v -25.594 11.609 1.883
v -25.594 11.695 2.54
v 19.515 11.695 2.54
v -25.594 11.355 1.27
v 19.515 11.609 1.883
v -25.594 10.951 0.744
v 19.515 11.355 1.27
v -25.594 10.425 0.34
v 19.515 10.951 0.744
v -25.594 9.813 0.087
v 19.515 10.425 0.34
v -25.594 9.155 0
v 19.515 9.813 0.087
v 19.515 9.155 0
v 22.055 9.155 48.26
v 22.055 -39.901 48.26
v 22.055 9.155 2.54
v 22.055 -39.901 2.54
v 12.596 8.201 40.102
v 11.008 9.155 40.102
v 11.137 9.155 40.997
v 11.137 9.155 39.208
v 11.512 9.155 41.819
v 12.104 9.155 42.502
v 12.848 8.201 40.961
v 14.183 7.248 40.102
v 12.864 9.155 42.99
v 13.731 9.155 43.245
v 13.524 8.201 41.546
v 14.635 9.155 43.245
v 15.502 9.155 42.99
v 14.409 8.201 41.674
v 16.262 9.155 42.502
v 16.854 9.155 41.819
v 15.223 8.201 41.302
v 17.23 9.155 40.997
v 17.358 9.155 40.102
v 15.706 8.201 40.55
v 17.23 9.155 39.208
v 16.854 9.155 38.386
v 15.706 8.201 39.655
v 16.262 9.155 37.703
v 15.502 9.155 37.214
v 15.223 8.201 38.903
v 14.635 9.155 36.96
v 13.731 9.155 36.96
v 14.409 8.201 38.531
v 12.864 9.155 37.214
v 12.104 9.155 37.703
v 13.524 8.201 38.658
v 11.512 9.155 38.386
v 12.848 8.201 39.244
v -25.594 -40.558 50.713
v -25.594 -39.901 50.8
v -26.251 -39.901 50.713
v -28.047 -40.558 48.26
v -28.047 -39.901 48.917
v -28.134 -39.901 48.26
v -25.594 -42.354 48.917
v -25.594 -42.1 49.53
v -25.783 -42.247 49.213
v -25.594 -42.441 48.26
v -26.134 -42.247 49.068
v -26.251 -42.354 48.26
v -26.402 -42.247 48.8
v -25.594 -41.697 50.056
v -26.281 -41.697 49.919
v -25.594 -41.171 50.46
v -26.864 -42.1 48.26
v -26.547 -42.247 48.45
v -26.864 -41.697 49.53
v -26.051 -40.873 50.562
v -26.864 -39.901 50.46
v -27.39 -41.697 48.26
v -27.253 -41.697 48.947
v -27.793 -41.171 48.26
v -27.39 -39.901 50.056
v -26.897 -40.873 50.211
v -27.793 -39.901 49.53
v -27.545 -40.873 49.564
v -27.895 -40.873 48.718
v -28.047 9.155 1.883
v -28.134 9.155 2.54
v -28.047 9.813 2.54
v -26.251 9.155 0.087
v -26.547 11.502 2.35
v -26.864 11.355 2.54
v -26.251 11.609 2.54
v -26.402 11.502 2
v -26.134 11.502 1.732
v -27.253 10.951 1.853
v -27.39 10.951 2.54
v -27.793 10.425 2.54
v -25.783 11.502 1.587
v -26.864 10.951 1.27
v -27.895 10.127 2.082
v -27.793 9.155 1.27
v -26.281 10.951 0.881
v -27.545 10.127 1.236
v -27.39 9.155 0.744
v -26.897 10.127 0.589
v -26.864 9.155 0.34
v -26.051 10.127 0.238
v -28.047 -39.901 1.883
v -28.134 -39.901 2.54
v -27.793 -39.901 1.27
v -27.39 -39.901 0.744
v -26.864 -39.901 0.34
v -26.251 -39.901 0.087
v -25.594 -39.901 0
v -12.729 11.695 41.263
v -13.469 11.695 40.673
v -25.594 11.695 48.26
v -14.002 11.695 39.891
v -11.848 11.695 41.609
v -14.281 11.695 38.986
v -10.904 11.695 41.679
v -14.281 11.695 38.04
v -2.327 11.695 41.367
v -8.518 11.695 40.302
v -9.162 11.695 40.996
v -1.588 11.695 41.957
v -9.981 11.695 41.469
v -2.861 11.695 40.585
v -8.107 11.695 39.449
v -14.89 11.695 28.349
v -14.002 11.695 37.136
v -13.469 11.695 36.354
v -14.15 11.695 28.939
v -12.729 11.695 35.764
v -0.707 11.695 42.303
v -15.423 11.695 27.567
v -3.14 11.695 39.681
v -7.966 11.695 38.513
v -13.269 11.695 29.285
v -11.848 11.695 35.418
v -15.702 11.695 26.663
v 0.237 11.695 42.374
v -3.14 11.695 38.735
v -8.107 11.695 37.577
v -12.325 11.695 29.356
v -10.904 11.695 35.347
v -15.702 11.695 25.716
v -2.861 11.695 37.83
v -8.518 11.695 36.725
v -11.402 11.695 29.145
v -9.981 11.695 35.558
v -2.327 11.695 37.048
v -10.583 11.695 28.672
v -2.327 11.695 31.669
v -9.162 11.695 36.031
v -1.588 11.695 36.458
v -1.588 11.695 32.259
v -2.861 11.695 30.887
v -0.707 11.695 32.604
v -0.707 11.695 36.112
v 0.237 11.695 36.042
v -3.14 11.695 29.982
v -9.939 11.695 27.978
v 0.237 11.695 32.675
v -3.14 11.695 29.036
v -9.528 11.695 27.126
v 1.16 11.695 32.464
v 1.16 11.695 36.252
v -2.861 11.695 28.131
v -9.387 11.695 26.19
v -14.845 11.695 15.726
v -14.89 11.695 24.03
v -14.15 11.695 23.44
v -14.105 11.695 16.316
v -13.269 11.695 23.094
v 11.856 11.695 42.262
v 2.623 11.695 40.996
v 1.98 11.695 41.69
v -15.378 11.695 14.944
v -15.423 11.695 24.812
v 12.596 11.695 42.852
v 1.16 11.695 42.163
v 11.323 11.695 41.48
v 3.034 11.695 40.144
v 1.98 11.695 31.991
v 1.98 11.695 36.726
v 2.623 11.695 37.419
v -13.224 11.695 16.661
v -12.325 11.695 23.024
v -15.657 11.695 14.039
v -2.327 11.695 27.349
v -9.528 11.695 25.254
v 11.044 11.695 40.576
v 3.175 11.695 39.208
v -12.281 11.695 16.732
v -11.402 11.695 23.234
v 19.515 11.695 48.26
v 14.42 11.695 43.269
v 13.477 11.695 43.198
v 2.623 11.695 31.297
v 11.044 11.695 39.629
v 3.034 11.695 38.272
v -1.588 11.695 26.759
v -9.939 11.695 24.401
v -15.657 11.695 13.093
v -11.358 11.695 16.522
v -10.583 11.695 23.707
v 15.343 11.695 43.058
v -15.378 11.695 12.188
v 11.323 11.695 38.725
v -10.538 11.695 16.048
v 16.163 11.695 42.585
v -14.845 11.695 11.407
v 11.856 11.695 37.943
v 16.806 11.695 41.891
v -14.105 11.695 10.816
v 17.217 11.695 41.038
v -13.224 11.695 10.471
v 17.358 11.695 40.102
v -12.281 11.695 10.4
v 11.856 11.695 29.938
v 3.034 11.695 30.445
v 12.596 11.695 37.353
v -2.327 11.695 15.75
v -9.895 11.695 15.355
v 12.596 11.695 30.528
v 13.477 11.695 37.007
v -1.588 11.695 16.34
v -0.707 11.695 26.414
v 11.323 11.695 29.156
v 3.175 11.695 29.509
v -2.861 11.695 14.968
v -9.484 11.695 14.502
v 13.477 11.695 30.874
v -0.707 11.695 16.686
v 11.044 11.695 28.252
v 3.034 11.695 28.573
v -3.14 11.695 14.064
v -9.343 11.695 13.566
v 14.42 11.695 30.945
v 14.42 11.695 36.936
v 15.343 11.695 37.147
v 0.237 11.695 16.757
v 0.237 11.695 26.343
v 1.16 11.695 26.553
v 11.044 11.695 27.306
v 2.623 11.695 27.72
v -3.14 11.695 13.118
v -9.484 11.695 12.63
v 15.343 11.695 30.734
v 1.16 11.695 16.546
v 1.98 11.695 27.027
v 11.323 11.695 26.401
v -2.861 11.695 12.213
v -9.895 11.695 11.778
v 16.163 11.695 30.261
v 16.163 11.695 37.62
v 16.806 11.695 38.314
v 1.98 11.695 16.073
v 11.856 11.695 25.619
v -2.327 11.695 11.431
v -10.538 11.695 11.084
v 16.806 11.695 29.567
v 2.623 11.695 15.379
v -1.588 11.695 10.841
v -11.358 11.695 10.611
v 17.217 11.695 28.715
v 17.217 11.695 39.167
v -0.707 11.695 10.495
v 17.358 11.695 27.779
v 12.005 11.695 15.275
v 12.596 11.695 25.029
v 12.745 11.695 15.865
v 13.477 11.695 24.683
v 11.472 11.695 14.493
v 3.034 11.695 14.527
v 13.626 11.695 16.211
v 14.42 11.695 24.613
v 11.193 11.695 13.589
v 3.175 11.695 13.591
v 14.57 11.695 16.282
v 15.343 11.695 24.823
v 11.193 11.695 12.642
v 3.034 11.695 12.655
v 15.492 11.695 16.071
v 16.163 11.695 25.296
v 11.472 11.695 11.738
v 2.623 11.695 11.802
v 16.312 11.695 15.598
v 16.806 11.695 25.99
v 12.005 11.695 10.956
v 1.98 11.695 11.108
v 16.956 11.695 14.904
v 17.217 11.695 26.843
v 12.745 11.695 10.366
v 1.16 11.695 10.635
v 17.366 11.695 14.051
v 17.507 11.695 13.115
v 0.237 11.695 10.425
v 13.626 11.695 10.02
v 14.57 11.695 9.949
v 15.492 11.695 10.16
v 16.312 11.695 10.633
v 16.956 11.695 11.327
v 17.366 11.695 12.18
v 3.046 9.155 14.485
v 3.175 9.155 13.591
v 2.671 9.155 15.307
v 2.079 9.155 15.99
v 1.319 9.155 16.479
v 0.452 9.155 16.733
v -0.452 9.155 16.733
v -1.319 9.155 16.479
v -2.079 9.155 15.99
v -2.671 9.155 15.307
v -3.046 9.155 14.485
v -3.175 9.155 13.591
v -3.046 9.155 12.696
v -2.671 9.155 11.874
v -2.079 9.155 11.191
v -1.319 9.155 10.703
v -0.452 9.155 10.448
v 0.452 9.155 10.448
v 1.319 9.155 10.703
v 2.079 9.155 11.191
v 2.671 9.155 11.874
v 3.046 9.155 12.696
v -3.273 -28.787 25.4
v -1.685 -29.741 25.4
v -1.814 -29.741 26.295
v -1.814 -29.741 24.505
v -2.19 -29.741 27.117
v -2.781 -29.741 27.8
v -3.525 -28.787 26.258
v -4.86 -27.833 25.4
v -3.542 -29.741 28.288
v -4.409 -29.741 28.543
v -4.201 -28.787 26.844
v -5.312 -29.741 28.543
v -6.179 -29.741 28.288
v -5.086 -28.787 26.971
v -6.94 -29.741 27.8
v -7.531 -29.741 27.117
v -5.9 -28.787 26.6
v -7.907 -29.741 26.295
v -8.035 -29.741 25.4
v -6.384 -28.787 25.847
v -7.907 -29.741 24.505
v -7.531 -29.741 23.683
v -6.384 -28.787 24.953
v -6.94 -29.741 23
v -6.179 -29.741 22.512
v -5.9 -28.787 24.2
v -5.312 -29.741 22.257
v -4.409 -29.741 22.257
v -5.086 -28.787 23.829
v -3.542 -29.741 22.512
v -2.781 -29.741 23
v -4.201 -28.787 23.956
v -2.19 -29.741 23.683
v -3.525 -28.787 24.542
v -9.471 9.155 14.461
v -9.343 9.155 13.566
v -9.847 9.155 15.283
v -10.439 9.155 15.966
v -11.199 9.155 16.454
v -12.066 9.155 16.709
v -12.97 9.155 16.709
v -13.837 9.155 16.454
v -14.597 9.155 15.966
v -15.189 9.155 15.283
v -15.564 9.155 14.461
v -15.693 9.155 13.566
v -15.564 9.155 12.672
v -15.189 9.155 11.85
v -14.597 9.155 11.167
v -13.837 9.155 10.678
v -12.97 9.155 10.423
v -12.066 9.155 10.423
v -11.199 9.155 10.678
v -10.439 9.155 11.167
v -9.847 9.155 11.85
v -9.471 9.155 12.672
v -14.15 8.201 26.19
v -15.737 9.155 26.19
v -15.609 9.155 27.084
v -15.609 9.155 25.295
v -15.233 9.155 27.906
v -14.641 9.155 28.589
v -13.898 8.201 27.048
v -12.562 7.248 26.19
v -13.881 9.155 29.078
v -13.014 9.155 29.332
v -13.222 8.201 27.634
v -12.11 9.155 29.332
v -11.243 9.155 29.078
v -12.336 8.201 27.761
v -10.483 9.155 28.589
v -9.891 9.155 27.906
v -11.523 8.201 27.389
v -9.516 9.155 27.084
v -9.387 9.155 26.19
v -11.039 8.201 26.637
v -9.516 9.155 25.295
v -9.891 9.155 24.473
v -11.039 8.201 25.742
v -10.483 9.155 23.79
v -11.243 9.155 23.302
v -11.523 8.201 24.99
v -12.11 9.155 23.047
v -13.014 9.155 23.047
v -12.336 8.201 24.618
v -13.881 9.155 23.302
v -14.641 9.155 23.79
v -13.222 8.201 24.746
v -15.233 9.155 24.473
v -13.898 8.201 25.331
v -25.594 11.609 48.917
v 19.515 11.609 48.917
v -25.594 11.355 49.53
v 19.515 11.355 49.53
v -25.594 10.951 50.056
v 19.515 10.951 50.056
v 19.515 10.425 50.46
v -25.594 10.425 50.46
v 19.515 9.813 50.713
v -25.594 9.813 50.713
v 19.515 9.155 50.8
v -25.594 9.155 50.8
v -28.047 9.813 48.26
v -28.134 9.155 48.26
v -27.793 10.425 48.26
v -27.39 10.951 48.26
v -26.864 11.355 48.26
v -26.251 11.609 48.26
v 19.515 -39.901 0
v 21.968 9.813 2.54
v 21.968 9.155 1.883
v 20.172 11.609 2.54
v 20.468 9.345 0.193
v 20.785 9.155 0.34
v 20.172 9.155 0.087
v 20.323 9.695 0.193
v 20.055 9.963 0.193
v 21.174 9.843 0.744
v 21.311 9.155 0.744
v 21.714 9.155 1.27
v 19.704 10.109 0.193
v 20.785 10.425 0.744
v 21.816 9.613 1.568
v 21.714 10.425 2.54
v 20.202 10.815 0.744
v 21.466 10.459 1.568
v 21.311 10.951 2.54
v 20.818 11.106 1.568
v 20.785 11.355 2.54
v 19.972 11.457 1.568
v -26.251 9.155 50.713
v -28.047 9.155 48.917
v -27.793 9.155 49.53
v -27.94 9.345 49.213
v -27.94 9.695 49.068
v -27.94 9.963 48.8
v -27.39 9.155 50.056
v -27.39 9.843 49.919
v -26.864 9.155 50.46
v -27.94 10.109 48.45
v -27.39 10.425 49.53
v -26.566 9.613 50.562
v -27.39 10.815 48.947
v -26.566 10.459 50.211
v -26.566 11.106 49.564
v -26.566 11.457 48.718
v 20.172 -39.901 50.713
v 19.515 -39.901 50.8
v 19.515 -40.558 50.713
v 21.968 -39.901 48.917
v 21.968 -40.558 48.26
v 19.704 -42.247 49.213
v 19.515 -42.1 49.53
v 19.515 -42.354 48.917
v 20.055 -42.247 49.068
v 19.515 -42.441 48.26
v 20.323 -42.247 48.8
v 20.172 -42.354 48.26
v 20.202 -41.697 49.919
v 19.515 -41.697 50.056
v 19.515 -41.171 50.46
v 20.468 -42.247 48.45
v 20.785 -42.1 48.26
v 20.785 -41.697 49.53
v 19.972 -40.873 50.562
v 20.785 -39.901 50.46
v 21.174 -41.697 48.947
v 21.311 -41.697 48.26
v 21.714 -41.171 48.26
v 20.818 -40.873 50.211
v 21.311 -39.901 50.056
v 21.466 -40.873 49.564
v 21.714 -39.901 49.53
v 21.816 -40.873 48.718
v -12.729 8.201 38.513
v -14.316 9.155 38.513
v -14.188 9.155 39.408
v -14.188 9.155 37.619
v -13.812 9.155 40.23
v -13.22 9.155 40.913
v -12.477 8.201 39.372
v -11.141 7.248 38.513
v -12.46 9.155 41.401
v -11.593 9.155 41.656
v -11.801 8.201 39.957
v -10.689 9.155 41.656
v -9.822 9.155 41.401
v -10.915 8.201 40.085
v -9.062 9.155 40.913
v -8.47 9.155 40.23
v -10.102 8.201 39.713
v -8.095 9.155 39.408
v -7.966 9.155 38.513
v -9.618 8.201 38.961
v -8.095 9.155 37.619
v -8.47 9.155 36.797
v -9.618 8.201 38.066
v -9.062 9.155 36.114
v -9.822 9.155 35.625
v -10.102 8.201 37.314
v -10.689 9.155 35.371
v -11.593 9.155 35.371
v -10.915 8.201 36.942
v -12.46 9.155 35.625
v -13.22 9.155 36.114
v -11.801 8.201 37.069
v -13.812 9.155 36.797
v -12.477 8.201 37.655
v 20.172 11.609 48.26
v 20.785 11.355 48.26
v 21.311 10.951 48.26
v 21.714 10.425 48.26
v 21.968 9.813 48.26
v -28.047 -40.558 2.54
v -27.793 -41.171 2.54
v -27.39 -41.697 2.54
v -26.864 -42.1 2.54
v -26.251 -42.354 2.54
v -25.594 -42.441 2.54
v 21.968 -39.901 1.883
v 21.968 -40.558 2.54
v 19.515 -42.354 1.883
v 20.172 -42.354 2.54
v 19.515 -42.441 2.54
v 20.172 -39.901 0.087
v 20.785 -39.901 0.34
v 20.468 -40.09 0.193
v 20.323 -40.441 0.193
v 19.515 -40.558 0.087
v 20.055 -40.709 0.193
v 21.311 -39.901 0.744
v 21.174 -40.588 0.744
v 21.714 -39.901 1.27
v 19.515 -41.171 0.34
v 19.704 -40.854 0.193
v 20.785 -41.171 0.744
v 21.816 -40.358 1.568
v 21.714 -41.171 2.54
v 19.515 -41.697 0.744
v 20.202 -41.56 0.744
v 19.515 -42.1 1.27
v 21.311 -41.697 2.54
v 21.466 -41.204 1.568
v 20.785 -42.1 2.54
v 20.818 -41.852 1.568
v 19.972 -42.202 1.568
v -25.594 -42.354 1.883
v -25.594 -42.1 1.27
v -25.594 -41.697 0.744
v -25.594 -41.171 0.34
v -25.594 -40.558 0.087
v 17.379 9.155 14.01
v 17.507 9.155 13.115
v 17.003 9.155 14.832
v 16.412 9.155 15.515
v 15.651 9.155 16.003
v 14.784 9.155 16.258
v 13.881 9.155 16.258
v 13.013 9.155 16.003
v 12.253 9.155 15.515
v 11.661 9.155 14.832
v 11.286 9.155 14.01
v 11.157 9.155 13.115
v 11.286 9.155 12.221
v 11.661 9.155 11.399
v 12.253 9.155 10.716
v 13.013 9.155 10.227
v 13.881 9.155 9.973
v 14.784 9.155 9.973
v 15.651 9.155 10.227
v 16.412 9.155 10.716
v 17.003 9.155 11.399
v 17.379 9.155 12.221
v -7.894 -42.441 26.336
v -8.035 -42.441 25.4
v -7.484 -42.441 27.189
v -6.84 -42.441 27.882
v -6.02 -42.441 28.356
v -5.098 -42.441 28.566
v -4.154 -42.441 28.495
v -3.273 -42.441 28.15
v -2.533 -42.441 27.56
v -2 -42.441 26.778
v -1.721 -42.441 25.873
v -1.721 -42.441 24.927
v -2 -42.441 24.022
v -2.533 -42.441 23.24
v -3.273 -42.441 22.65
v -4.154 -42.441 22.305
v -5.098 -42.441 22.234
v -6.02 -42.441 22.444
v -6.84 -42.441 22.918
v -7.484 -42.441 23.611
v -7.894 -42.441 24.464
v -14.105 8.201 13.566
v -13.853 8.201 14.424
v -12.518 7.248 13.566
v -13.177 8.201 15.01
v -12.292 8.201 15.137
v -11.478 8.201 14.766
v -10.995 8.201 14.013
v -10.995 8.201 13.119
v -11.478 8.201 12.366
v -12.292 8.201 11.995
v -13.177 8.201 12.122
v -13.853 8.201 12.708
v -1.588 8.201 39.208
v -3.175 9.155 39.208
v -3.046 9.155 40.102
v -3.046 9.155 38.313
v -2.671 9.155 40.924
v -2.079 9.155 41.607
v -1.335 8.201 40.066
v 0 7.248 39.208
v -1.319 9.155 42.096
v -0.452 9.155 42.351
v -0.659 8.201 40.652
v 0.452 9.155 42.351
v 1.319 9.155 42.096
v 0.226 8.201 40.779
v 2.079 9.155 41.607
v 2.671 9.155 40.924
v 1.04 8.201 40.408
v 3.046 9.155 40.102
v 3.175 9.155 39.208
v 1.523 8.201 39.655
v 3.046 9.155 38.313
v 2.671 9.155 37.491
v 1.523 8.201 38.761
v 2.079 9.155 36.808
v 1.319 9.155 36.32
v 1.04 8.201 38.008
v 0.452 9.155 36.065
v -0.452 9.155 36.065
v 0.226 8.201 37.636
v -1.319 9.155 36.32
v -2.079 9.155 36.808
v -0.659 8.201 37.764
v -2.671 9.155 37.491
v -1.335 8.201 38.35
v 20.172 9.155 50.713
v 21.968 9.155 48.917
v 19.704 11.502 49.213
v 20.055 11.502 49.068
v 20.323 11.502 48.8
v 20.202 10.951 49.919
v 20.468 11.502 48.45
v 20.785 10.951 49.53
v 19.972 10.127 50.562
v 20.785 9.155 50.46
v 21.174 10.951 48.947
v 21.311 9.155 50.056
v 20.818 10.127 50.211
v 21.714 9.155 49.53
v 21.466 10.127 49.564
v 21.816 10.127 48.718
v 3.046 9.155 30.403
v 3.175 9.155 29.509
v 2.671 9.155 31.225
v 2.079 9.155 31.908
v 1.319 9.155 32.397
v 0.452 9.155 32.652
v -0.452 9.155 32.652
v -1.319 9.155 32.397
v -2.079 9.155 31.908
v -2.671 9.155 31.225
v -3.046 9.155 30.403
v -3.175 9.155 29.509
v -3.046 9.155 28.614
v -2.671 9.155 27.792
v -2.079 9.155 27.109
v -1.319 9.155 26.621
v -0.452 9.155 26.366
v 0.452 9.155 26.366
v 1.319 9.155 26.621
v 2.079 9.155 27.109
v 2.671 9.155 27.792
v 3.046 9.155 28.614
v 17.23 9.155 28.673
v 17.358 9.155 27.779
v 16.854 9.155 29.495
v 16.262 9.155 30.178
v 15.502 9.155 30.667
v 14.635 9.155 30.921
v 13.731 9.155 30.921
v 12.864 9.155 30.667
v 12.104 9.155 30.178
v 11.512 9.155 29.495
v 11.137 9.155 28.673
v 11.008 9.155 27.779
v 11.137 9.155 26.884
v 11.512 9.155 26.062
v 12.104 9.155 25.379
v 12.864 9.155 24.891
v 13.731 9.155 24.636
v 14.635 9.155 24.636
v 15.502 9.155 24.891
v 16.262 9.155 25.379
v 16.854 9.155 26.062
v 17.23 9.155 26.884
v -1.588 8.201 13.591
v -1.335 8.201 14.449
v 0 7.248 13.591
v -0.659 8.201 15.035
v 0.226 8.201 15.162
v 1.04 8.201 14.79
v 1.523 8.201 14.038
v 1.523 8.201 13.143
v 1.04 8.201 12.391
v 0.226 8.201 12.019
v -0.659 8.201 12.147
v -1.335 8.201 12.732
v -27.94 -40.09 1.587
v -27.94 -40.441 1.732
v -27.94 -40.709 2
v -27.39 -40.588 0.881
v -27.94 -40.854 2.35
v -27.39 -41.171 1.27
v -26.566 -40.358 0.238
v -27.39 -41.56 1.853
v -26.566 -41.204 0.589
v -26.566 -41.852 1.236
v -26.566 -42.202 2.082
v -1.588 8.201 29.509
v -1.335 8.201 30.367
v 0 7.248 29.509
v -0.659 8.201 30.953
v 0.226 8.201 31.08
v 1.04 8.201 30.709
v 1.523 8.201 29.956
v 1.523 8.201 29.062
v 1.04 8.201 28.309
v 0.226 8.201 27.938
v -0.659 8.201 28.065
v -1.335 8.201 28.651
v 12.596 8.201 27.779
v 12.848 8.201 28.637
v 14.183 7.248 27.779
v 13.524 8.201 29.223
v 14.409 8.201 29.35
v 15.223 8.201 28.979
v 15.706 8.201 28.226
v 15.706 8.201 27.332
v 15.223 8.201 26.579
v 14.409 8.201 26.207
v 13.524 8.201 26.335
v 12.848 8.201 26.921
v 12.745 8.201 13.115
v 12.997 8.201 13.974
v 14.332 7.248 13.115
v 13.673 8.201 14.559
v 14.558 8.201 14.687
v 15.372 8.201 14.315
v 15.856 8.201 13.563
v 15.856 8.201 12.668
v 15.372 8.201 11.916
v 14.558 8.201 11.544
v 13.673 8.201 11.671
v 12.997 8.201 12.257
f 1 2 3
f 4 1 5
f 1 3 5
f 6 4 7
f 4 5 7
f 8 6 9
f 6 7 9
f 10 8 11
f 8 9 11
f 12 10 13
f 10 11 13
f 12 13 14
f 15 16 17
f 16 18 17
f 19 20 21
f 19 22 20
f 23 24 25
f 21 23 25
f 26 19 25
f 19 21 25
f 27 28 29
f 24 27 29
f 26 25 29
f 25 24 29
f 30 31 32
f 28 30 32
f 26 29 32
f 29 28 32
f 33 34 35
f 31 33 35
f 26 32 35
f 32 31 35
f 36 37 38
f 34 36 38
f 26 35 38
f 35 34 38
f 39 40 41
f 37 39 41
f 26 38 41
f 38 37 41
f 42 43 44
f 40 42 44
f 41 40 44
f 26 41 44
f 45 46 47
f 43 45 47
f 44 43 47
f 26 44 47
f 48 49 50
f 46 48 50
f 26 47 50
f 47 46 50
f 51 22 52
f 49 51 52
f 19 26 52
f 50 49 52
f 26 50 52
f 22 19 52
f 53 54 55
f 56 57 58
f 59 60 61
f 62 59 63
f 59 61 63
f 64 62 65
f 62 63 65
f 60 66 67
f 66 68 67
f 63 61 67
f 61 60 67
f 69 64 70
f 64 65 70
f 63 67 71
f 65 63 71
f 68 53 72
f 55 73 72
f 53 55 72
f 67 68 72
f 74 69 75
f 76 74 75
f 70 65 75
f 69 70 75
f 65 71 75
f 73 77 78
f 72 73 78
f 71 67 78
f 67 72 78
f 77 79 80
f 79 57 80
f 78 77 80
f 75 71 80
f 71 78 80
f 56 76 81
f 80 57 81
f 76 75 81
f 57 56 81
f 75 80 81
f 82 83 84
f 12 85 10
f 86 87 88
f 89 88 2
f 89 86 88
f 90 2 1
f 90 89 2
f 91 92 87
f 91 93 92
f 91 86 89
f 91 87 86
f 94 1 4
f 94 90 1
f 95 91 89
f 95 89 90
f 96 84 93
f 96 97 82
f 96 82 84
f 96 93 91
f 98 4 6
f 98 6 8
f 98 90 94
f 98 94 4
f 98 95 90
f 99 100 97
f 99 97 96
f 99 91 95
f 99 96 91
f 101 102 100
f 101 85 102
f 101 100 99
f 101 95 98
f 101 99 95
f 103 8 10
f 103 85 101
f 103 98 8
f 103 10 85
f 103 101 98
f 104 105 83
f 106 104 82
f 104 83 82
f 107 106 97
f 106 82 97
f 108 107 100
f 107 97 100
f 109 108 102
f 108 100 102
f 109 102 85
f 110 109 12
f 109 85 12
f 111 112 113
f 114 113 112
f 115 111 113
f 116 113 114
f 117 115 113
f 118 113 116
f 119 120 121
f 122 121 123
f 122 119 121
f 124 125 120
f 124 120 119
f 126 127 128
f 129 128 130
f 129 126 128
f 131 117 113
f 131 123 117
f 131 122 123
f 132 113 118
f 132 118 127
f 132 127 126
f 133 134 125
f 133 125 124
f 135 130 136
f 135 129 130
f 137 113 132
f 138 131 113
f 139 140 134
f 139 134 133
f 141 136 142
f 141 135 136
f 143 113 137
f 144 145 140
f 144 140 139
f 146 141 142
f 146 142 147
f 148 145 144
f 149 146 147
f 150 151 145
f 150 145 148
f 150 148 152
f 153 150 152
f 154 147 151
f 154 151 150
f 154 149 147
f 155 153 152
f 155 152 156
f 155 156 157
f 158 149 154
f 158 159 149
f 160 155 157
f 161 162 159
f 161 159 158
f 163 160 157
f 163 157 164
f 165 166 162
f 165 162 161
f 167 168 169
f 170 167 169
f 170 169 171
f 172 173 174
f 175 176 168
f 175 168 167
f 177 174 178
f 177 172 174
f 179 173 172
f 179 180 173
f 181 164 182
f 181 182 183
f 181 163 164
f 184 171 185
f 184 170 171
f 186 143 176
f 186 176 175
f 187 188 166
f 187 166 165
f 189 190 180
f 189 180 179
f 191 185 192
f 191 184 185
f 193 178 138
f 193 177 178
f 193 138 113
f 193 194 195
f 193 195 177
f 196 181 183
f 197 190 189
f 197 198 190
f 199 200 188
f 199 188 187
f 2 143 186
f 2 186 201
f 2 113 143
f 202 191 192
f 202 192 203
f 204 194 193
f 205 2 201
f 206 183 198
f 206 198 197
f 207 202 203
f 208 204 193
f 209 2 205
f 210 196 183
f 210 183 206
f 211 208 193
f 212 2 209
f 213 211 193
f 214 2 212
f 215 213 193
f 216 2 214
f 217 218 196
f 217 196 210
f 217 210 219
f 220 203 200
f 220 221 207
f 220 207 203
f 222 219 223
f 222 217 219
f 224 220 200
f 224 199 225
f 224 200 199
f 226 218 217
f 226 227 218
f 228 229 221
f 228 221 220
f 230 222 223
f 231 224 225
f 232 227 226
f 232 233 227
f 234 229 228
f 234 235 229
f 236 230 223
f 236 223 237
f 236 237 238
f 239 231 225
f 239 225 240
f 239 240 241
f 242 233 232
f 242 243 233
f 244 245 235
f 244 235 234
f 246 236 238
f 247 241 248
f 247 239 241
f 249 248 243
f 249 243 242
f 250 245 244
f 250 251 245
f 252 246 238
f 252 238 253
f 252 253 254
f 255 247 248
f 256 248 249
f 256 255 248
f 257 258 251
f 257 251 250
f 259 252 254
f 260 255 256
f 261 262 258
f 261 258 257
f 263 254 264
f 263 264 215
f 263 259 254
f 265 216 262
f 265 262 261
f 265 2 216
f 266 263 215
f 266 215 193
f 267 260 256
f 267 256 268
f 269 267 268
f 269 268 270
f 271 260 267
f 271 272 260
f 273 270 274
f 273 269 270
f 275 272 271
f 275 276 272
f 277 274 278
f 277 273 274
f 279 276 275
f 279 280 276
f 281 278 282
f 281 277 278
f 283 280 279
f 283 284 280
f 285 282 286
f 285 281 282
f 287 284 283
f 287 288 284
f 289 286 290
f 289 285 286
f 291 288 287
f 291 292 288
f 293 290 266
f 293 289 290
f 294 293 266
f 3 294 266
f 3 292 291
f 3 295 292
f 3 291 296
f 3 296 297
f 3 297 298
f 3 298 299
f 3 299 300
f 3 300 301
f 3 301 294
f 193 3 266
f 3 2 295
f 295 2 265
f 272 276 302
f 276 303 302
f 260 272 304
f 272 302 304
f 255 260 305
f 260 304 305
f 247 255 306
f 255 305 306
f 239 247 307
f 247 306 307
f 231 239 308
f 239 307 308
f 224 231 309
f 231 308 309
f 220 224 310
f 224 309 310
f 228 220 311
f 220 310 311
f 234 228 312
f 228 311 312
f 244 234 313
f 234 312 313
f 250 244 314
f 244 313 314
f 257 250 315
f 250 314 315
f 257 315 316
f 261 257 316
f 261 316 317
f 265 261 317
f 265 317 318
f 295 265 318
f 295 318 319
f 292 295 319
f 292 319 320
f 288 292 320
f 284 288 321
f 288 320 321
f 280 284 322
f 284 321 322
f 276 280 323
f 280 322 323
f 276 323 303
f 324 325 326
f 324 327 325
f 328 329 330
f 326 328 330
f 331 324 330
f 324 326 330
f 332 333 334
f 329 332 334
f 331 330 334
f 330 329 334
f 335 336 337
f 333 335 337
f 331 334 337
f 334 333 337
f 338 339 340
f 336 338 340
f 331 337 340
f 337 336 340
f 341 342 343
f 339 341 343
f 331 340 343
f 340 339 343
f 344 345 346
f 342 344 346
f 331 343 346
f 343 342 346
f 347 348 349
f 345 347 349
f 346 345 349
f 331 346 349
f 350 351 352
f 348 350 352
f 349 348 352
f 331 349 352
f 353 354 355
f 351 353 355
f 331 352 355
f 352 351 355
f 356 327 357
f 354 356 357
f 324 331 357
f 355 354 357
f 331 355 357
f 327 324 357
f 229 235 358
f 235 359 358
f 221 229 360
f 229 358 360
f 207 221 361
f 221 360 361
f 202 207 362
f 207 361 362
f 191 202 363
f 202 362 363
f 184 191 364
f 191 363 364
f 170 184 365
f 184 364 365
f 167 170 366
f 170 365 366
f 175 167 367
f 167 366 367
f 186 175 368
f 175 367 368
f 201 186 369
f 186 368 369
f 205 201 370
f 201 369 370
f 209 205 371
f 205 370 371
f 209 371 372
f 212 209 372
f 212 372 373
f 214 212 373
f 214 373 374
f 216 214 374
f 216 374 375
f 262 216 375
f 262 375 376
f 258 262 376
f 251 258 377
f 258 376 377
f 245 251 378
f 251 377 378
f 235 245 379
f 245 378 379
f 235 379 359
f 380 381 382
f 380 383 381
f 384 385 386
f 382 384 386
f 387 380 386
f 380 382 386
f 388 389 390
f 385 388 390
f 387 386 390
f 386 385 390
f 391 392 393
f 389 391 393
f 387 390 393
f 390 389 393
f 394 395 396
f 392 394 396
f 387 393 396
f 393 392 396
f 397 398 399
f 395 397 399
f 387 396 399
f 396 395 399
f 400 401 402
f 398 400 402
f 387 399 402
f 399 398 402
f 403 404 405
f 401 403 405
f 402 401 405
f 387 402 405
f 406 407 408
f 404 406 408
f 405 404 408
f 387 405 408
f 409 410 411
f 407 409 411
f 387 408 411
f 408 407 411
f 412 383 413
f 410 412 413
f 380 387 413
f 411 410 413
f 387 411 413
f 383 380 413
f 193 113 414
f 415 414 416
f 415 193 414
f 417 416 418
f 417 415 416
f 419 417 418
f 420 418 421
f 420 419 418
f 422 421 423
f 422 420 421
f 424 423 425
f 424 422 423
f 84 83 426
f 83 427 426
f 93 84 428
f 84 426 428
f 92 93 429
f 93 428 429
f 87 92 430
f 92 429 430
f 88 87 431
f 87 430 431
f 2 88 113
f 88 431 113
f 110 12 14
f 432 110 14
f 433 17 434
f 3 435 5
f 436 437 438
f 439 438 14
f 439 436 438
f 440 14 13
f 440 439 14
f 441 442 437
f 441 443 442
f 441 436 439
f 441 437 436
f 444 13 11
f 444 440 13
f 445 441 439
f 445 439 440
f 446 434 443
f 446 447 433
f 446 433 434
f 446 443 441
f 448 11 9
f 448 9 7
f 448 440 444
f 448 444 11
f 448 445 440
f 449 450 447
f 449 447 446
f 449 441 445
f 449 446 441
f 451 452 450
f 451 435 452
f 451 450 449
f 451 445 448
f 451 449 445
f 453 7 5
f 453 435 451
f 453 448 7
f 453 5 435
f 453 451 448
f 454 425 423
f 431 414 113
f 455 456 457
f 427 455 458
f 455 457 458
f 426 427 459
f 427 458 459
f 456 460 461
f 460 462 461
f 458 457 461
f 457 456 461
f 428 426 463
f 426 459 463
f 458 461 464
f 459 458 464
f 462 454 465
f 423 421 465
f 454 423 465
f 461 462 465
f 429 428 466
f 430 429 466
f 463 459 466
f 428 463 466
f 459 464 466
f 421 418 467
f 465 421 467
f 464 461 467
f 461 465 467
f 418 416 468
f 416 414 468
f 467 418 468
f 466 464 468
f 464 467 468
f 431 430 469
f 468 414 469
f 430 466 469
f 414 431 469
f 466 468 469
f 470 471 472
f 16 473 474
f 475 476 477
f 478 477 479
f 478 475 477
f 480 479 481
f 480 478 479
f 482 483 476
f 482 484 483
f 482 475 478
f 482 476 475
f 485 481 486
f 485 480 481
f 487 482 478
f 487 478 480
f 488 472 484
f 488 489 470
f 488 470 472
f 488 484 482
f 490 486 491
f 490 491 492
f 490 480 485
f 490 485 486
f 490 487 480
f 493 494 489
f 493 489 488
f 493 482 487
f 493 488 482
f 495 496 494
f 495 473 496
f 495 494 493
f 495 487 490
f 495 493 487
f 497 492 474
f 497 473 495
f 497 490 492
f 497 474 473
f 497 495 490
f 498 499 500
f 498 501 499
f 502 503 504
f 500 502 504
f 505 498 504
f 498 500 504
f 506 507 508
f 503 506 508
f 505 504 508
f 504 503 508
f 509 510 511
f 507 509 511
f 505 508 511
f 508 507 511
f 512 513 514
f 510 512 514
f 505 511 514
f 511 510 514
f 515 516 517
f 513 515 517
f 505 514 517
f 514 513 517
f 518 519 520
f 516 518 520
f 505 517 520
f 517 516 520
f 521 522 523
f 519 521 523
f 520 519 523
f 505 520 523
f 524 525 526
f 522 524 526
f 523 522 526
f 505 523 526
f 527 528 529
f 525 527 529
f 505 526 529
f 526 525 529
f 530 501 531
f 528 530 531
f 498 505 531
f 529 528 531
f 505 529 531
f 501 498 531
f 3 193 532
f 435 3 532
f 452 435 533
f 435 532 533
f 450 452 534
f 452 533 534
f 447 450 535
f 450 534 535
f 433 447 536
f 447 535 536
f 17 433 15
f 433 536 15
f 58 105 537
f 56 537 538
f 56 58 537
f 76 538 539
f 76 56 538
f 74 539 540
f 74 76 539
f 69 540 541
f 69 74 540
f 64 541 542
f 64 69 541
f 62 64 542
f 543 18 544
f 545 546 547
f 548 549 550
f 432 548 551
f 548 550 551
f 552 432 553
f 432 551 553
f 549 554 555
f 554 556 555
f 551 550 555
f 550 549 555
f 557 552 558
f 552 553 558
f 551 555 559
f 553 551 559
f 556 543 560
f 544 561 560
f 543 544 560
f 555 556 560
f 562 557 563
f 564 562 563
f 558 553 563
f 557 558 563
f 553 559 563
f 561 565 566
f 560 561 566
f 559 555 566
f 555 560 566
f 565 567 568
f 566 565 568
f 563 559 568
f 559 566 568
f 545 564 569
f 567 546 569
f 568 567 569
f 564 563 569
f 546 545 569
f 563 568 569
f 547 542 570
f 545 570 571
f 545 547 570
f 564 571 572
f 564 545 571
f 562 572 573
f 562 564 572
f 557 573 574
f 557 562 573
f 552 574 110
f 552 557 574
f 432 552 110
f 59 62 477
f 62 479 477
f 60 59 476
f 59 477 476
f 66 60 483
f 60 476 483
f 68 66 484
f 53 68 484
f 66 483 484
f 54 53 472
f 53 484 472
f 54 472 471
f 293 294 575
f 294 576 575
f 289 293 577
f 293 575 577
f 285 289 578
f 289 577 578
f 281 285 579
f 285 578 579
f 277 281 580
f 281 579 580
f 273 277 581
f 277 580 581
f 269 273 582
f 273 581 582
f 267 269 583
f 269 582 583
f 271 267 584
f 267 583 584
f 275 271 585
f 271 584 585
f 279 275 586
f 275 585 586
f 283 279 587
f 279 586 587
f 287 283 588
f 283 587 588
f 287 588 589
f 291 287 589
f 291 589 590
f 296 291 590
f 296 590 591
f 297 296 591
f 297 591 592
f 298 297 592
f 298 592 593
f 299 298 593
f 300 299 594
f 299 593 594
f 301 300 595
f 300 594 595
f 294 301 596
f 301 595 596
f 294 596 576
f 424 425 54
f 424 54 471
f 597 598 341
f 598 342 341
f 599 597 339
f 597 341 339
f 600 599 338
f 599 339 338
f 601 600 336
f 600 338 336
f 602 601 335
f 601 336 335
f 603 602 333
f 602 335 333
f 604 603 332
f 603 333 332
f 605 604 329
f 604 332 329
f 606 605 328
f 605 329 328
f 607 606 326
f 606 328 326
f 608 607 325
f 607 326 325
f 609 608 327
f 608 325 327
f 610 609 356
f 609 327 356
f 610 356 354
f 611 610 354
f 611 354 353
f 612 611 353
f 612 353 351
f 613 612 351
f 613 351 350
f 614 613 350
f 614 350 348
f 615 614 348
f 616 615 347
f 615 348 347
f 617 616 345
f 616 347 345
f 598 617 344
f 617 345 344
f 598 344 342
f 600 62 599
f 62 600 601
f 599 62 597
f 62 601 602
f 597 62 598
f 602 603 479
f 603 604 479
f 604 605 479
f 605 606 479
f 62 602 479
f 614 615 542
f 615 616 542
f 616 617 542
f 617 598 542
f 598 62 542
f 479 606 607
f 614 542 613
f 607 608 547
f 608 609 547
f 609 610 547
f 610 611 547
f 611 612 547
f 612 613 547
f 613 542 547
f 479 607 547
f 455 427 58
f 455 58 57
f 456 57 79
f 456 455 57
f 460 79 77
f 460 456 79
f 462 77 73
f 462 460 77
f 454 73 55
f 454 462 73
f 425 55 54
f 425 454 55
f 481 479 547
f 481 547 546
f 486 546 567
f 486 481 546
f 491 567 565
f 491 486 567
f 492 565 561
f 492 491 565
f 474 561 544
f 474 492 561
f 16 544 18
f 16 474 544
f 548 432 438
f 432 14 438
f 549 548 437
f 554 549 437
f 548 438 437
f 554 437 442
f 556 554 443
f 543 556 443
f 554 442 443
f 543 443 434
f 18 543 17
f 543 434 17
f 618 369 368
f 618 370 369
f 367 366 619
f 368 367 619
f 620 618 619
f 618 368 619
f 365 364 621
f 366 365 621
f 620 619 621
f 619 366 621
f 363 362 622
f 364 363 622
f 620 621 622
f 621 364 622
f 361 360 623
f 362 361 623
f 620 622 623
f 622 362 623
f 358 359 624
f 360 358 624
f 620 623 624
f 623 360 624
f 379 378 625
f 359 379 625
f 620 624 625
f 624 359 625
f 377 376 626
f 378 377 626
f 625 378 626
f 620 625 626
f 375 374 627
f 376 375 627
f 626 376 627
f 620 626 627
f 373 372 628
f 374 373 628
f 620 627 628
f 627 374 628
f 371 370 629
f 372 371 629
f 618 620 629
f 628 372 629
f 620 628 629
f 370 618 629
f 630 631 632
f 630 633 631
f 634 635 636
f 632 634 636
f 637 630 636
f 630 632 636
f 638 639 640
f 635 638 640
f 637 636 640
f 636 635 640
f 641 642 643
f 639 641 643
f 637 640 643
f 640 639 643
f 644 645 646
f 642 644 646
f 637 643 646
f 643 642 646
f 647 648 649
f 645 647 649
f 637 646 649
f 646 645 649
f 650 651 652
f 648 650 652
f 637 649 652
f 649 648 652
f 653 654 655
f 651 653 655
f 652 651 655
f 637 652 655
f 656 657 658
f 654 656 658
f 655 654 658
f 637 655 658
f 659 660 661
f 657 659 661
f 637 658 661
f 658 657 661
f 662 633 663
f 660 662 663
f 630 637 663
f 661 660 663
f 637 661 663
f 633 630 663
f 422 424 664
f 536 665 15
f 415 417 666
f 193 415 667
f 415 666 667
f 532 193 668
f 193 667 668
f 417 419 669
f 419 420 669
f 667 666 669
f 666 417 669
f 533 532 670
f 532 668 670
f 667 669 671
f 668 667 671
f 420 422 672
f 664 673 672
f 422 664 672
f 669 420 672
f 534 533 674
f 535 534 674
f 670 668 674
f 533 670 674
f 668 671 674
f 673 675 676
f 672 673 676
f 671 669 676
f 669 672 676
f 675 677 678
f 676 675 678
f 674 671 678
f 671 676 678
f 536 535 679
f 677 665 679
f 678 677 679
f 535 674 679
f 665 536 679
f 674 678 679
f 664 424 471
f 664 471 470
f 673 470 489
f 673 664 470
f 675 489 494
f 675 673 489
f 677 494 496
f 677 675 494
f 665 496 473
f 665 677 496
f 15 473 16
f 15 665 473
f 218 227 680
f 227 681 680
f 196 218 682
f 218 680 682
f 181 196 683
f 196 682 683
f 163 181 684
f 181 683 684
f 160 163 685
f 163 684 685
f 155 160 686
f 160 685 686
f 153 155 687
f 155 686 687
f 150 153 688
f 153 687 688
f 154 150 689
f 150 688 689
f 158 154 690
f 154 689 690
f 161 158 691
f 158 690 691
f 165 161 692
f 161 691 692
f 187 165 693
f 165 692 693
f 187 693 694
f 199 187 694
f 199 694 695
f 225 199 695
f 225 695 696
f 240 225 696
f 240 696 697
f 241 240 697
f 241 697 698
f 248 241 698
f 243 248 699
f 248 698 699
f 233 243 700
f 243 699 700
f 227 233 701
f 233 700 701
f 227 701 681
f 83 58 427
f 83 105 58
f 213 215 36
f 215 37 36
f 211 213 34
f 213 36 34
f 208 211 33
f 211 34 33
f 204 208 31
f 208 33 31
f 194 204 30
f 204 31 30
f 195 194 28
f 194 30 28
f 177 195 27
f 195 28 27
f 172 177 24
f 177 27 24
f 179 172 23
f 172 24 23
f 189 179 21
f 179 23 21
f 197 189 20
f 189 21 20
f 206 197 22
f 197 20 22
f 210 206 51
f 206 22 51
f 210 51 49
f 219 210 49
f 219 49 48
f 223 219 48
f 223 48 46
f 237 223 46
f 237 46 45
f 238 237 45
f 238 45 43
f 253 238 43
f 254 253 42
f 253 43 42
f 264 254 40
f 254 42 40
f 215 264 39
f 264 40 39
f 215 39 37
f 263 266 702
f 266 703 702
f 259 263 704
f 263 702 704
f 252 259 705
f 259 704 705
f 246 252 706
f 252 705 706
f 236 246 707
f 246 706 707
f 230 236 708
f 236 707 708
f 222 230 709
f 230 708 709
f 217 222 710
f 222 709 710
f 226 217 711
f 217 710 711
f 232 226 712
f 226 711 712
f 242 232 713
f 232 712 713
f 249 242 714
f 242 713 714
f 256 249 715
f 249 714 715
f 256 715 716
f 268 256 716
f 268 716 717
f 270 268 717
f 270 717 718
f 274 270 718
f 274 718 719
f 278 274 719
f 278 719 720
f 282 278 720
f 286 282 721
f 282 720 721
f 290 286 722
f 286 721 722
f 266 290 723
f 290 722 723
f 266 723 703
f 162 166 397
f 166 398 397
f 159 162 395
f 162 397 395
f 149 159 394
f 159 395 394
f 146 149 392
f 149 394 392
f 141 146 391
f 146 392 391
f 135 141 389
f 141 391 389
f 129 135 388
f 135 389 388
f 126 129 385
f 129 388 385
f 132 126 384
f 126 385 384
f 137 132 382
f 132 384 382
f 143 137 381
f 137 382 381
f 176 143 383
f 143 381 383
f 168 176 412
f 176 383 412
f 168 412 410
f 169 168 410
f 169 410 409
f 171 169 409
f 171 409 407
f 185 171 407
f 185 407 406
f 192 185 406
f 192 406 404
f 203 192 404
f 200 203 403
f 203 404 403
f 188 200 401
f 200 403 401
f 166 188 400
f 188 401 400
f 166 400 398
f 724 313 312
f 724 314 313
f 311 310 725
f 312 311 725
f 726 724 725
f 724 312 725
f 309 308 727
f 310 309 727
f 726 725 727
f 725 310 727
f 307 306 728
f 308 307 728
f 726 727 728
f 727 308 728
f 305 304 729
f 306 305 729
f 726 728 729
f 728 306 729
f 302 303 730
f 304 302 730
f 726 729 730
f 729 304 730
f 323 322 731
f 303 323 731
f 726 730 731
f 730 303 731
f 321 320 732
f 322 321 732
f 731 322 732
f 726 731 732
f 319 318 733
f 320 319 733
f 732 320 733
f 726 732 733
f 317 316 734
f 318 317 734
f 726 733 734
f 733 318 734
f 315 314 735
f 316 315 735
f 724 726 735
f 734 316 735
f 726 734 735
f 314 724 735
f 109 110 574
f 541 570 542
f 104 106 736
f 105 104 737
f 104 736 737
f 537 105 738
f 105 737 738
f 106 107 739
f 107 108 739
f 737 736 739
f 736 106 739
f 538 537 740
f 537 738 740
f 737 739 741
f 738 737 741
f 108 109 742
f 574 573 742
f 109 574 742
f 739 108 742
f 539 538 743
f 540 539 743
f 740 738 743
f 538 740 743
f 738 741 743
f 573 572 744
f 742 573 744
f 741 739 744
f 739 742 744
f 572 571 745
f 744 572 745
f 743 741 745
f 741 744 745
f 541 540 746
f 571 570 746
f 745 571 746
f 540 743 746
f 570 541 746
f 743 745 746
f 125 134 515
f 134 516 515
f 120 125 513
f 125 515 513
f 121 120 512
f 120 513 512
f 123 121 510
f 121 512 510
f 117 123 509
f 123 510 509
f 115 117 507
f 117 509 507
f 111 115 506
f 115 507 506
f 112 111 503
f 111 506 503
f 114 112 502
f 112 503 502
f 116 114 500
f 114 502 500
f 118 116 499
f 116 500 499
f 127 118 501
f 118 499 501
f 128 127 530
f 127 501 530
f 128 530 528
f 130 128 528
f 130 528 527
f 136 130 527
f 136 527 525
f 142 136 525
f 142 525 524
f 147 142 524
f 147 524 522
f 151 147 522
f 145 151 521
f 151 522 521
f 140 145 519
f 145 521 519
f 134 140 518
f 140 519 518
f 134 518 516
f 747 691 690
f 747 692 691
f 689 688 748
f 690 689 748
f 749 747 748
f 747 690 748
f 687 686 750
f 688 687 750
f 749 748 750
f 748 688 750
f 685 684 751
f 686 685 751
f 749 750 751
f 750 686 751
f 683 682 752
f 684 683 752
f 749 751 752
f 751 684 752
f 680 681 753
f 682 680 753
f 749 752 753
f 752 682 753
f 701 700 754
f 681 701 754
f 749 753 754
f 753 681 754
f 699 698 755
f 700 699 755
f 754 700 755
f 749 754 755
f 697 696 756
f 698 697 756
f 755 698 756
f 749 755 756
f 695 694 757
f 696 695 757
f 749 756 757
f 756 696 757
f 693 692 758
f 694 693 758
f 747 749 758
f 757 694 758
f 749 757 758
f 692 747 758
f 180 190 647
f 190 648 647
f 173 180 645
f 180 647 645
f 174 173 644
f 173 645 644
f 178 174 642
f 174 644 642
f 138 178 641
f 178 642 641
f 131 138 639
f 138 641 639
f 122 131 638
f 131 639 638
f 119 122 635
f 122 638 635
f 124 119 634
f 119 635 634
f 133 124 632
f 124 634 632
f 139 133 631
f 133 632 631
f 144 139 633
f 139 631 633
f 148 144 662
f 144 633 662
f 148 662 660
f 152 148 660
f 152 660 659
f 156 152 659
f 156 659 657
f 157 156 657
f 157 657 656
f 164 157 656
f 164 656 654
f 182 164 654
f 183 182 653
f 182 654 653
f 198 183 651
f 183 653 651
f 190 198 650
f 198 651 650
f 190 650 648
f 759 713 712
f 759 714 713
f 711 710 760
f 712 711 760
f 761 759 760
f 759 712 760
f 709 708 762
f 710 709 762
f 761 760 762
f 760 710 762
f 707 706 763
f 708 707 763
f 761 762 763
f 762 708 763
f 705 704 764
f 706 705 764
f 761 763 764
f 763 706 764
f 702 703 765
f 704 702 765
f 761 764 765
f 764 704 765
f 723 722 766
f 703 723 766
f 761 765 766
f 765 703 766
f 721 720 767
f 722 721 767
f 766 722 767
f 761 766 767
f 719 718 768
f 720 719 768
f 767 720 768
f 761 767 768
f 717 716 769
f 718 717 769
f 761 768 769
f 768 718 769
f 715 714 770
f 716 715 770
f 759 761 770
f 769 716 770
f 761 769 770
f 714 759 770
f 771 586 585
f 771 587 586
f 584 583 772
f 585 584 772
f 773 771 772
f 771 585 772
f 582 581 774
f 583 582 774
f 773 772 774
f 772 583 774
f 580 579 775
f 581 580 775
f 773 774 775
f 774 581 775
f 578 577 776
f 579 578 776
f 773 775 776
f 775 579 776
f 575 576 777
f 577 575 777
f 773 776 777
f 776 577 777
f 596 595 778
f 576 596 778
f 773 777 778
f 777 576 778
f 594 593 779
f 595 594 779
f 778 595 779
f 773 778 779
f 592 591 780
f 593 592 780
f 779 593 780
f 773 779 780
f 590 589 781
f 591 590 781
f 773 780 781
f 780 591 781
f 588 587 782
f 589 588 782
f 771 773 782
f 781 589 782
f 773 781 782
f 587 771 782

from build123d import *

# Parameters (mm, degrees)
F0_W     = 50.1882061362
F0_H     = 54.1358906776
F1_DEPTH = 50.8
F3_D     = 6.35
F3_DEPTH = 12.7
F3_TIP   = 1.9077324654
F5_D     = 6.35
F5_DEPTH = 2.54
F5_TIP   = 1.9077324654
F6_R     = 2.54


with BuildPart() as f1:
    # F0 (on Top) → F1 (new body)
    with BuildSketch(Plane.XY):
        with Locations((-3.0394289643, -15.3726739809)):
            Rectangle(F0_W, F0_H)
    extrude(amount=F1_DEPTH)

    # F3
    with Locations(Plane.XZ.offset(42.4406193197)):
        with Locations((-4.8604877666, 25.4)):
            Hole(F3_D / 2, depth=F3_DEPTH)
            with Locations((0, 0, -(F3_DEPTH + F3_TIP / 2))):  # 118° drill point
                Cone(0, F3_D / 2, F3_TIP, mode=Mode.SUBTRACT)

    # F5
    with Locations(Plane(origin=(0, 11.6952713579, 0), x_dir=(-1, 0, 0), z_dir=(0, 1, 0))):
        with Locations((12.5178480521, 13.5660590604), (0, 13.5907363147), (-14.3324285746, 13.1154032424), (-14.1831636429, 27.7787912637), (0, 29.508953914), (12.5623010099, 26.1896699667), (11.1412229016, 38.5132730007), (0, 39.2078347504), (-14.1831636429, 40.1023961604)):
            Hole(F5_D / 2, depth=F5_DEPTH)
            with Locations((0, 0, -(F5_DEPTH + F5_TIP / 2))):  # 118° drill point
                Cone(0, F5_D / 2, F5_TIP, mode=Mode.SUBTRACT)

    # F6
    f6_edges = [f1.edges().sort_by_distance(p)[0] for p in [
        (22.054674, -15.372674, 50.8),
        (-3.039429, 11.695271, 50.8),
        (-28.133532, -15.372674, 50.8),
        (-3.039429, -42.440619, 50.8),
        (22.054674, 11.695271, 25.4),
        (22.054674, -42.440619, 25.4),
        (22.054674, -15.372674, 0),
        (-3.039429, -42.440619, 0),
        (-28.133532, -15.372674, 0),
        (-28.133532, 11.695271, 25.4),
        (-3.039429, 11.695271, 0),
        (-28.133532, -42.440619, 25.4),
    ]]
    fillet(f6_edges, radius=F6_R)


solid = f1.part
